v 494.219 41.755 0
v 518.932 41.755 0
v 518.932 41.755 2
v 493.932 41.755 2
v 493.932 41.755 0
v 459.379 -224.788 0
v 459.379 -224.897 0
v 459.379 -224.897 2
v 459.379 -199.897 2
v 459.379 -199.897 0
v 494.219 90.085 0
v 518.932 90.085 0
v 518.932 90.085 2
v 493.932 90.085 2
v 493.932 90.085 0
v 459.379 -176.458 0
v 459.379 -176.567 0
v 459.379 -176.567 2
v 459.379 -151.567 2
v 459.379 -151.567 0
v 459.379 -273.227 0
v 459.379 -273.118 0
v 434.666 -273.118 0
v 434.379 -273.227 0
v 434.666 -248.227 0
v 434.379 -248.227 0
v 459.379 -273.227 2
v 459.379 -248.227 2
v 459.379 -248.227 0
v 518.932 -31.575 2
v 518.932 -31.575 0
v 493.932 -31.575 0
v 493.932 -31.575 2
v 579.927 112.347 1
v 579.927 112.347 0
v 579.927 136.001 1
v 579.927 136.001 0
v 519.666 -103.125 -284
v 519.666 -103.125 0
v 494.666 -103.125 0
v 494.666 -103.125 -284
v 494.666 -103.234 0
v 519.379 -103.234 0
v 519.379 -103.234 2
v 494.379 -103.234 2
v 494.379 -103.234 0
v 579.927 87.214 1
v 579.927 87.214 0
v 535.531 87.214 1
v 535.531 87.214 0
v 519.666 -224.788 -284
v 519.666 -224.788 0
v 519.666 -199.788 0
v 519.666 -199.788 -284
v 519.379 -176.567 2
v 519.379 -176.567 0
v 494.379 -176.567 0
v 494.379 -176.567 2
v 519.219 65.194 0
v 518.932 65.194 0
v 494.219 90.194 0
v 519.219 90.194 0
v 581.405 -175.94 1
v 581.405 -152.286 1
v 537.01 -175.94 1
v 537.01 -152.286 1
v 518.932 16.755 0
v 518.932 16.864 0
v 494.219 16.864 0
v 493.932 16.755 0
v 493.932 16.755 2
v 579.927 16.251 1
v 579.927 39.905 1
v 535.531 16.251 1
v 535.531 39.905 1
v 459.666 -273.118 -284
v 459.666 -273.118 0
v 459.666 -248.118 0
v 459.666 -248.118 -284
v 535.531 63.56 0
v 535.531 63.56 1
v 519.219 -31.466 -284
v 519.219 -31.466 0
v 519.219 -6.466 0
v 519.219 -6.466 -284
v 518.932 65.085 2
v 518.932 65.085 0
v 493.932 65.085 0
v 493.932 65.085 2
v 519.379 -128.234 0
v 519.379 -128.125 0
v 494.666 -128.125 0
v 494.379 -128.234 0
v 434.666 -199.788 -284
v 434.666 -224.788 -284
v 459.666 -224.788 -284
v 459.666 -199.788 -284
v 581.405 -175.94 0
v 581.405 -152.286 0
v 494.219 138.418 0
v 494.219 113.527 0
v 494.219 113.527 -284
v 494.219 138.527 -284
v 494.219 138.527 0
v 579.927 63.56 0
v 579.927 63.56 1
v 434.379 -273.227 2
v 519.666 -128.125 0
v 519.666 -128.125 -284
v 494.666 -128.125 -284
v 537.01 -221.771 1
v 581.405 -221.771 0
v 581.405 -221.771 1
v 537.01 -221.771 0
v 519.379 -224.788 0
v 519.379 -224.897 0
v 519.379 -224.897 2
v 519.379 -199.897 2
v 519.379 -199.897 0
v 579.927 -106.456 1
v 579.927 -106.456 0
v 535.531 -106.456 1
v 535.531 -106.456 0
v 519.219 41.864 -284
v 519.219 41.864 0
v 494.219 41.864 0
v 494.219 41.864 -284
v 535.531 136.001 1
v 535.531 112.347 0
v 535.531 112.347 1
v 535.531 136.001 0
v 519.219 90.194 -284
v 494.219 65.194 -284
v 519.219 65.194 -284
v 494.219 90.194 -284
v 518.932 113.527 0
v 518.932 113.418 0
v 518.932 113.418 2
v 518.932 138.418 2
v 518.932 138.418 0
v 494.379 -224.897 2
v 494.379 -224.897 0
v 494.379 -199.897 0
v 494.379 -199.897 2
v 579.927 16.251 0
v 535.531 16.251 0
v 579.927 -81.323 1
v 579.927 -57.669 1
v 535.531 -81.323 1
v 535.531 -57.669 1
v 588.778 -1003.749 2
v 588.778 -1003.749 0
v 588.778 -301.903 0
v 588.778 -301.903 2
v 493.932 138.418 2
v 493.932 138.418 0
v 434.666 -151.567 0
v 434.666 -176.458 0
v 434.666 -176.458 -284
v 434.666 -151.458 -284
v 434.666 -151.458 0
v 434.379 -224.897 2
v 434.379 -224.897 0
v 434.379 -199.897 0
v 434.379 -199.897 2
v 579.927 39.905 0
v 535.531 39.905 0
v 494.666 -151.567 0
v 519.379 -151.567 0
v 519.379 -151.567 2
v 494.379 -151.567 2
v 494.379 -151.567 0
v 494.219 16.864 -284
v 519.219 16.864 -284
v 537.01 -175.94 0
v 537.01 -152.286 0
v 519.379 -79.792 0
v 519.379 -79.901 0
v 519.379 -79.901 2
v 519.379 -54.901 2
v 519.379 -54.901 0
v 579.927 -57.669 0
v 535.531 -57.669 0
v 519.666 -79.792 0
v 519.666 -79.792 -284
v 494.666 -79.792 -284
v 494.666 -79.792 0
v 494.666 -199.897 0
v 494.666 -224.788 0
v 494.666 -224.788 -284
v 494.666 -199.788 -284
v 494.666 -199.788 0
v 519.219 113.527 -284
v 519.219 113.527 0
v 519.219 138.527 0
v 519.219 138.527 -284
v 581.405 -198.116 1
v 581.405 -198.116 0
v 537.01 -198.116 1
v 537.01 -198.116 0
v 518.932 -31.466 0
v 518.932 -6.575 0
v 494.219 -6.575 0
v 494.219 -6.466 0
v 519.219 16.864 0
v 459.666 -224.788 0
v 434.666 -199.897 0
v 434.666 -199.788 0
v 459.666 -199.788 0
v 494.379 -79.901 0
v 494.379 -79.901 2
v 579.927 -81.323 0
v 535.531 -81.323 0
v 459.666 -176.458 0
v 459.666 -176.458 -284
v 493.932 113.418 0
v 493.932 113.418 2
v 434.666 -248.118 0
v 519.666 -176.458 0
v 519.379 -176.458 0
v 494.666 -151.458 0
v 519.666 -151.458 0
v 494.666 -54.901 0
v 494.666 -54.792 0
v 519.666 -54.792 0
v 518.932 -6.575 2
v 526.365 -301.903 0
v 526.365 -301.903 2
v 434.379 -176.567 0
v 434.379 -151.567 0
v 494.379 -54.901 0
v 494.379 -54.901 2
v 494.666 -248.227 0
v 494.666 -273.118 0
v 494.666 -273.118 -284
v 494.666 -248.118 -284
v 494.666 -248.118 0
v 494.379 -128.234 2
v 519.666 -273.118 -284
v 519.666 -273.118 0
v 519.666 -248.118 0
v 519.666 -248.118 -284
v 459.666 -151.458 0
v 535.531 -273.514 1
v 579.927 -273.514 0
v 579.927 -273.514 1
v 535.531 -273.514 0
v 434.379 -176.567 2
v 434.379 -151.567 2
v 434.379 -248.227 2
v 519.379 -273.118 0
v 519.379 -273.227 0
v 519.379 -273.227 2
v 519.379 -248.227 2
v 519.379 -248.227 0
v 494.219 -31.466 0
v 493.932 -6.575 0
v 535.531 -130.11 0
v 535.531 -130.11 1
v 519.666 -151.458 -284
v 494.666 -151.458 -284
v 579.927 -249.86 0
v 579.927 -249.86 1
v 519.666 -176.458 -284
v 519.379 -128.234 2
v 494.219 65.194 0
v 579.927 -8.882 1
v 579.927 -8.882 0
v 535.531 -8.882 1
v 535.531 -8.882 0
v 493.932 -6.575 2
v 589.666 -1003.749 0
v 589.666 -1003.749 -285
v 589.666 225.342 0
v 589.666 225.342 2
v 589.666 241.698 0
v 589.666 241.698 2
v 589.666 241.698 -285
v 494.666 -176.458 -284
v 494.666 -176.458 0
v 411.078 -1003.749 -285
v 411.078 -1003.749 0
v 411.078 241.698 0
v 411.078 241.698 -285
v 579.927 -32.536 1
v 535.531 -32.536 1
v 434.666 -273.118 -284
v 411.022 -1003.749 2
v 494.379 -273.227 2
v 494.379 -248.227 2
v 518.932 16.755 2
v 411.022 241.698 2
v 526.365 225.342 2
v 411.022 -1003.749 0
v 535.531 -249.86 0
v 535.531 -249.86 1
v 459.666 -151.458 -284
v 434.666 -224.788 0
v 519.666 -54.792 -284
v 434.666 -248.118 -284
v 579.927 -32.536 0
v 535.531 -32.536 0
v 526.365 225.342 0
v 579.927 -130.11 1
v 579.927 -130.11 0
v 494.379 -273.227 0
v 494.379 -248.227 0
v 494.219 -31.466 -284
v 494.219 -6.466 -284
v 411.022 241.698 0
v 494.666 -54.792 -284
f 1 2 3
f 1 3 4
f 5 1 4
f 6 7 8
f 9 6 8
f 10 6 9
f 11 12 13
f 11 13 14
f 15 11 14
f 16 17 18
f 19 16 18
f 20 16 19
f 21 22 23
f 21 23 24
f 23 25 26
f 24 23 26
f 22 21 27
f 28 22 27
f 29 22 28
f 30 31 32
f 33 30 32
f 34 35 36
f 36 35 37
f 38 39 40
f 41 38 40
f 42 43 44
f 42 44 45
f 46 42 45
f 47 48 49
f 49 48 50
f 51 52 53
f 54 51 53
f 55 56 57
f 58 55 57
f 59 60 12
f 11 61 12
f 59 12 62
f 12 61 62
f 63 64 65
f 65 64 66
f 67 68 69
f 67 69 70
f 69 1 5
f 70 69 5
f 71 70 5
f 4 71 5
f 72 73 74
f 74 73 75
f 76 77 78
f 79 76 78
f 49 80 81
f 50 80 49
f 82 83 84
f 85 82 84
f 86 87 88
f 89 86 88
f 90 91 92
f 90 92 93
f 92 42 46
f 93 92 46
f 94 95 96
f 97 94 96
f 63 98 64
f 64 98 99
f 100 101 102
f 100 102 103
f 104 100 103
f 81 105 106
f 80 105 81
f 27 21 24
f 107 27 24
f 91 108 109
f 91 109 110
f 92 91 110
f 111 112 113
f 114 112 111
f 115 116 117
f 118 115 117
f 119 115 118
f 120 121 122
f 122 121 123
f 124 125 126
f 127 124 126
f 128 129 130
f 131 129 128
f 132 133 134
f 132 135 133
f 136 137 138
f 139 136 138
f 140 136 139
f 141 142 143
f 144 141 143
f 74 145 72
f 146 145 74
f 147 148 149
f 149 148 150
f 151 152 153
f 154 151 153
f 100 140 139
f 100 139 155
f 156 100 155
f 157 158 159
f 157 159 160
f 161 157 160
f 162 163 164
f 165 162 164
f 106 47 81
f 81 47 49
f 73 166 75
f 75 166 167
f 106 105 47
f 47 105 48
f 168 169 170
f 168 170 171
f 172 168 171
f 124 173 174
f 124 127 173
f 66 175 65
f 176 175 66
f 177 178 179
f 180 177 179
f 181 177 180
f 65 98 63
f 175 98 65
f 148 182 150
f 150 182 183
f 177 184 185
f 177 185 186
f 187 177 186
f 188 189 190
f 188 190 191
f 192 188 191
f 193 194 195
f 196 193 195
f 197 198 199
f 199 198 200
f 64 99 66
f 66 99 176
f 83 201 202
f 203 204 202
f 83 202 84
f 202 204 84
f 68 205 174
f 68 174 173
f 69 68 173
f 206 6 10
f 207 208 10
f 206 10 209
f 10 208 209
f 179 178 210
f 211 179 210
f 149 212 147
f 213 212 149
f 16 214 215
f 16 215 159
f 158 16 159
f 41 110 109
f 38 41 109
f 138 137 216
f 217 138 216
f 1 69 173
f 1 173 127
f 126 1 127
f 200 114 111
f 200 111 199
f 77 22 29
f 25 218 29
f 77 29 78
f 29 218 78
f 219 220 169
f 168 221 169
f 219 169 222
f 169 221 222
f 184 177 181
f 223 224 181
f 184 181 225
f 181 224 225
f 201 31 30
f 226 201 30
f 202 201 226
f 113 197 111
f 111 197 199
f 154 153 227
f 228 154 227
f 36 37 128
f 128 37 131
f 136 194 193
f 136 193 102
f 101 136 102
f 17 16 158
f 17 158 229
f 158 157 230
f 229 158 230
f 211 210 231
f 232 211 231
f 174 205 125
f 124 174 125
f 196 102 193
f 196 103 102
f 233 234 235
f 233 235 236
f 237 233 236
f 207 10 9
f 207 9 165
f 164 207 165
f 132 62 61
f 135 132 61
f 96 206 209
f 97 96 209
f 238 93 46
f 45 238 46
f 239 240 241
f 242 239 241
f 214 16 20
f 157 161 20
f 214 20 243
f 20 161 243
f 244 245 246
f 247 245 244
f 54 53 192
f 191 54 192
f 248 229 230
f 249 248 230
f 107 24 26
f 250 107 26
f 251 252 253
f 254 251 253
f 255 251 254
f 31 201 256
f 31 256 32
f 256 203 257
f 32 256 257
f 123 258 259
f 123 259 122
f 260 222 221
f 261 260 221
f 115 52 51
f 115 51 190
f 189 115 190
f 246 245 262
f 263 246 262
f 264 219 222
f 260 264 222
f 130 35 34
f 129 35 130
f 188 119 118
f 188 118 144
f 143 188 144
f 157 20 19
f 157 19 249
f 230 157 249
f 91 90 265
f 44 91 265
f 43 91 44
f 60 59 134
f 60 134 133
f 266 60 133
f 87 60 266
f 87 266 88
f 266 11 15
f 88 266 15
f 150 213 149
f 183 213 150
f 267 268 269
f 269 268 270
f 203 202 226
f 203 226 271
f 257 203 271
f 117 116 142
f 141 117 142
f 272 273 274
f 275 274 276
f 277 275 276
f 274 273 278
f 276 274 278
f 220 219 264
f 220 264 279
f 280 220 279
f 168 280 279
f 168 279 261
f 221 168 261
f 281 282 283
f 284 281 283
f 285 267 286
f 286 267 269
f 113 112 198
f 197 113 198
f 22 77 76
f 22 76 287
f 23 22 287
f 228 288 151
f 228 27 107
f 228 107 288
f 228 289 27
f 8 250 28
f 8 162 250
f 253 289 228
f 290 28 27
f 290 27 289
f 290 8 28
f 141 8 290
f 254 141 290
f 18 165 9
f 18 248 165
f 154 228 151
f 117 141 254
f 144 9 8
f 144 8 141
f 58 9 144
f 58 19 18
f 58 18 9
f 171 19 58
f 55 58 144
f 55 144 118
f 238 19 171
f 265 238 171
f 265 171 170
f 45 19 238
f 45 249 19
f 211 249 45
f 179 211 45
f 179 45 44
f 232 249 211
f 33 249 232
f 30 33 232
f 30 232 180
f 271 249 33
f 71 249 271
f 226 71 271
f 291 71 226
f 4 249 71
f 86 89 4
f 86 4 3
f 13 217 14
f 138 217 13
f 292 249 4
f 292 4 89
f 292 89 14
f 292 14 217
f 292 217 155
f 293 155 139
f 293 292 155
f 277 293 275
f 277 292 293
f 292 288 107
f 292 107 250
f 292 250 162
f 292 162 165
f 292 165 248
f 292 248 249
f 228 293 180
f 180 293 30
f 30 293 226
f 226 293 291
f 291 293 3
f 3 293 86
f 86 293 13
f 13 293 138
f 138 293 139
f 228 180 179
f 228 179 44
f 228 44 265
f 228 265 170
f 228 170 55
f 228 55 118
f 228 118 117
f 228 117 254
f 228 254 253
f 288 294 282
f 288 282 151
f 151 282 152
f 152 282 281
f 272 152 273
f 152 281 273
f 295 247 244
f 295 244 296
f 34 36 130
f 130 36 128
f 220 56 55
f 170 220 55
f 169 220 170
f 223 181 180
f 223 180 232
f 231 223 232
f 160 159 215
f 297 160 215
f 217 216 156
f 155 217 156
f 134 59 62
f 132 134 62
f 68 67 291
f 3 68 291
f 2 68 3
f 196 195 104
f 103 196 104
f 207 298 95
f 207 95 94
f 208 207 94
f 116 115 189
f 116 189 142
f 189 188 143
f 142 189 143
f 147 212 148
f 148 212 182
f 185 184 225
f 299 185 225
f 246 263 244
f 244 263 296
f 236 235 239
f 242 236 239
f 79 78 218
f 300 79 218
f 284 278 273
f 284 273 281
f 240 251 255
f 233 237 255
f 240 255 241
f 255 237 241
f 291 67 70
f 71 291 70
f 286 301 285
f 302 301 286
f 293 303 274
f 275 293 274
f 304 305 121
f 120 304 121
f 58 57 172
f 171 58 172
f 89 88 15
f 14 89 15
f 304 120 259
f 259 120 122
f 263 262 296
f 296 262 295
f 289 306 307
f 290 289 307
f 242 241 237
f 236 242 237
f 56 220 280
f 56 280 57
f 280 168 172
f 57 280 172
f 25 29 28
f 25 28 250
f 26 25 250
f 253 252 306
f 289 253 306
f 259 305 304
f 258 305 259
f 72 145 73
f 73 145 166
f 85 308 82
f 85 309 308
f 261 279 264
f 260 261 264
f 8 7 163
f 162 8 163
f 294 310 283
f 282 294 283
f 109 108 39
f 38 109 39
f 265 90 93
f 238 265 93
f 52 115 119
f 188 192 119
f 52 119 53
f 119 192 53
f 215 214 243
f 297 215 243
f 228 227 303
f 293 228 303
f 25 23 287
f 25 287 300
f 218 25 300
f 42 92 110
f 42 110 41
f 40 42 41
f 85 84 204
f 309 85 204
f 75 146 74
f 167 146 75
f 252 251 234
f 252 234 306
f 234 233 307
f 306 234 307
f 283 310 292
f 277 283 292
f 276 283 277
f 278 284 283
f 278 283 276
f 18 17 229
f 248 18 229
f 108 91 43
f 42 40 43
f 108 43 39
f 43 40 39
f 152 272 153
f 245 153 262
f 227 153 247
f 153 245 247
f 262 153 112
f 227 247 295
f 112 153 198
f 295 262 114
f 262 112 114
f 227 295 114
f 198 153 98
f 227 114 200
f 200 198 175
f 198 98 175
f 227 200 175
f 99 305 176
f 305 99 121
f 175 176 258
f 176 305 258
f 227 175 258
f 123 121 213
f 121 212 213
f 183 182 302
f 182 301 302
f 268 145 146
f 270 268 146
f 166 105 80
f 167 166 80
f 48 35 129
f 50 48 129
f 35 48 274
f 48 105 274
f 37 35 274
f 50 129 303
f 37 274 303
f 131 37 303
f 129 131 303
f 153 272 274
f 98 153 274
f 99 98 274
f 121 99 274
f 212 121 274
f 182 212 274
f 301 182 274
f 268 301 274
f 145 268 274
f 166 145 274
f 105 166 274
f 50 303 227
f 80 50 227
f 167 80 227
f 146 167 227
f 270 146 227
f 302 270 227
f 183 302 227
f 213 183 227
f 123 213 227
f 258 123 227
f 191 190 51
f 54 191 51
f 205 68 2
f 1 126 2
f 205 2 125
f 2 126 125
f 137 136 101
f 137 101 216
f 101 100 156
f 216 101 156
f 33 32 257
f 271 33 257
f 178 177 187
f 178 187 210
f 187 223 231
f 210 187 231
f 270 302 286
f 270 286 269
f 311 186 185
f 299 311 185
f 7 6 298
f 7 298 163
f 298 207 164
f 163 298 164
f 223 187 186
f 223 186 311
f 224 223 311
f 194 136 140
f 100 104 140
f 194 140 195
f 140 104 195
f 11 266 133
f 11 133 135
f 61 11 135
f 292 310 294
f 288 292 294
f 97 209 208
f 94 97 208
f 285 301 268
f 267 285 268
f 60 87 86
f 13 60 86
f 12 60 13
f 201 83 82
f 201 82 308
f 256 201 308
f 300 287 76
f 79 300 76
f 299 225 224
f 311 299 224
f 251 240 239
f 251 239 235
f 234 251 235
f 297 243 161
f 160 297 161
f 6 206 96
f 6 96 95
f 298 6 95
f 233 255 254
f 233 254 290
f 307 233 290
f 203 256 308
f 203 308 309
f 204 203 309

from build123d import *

# Parameters (mm, degrees)
CROQUIS1_W              = 178.587886288
CROQUIS1_H              = 1245.447721363
CROQUIS1_W_2            = 25
CROQUIS1_H_2            = 25
SALIENTE_EXTRUIR2_DEPTH = 285
CROQUIS2_W              = 178.587886288
CROQUIS2_H              = 552.844893509
SALIENTE_EXTRUIR3_DEPTH = 1
CROQUIS5_W              = 25
CROQUIS5_H              = 25
SALIENTE_EXTRUIR4_DEPTH = 2
CROQUIS10_W             = 44.39506519
CROQUIS10_H             = 23.654322964
CROQUIS10_H_2           = 23.654322963
SALIENTE_EXTRUIR5_DEPTH = 1


with BuildPart() as part:
    # Croquis1 → Saliente-Extruir2 (new body)
    with BuildSketch(Plane.XY):
        with Locations((121.784181129, -381.025603562)):
            Rectangle(CROQUIS1_W, CROQUIS1_H)
        with Locations((174.990237985, -163.957841157)):
            Rectangle(CROQUIS1_W_2, CROQUIS1_H_2, mode=Mode.SUBTRACT)
        with Locations((115.437079382, 126.027179256)):
            Rectangle(CROQUIS1_W_2, CROQUIS1_H_2, mode=Mode.SUBTRACT)
        with Locations((115.437079382, 77.694179256)):
            Rectangle(CROQUIS1_W_2, CROQUIS1_H_2, mode=Mode.SUBTRACT)
        with Locations((115.437079382, 29.364179256)):
            Rectangle(CROQUIS1_W_2, CROQUIS1_H_2, mode=Mode.SUBTRACT)
        with Locations((115.437079382, -18.965820744)):
            Rectangle(CROQUIS1_W_2, CROQUIS1_H_2, mode=Mode.SUBTRACT)
        with Locations((114.990237985, -67.291541157)):
            Rectangle(CROQUIS1_W_2, CROQUIS1_H_2, mode=Mode.SUBTRACT)
        with Locations((114.990237985, -115.624841157)):
            Rectangle(CROQUIS1_W_2, CROQUIS1_H_2, mode=Mode.SUBTRACT)
        with Locations((114.990237985, -163.957841157)):
            Rectangle(CROQUIS1_W_2, CROQUIS1_H_2, mode=Mode.SUBTRACT)
        with Locations((114.990237985, -212.287841157)):
            Rectangle(CROQUIS1_W_2, CROQUIS1_H_2, mode=Mode.SUBTRACT)
        with Locations((114.990237985, -260.617841157)):
            Rectangle(CROQUIS1_W_2, CROQUIS1_H_2, mode=Mode.SUBTRACT)
        with Locations((174.990237985, -212.287841157)):
            Rectangle(CROQUIS1_W_2, CROQUIS1_H_2, mode=Mode.SUBTRACT)
        with Locations((174.990237985, -260.617841157)):
            Rectangle(CROQUIS1_W_2, CROQUIS1_H_2, mode=Mode.SUBTRACT)
    extrude(amount=-SALIENTE_EXTRUIR2_DEPTH)

    # Croquis2 → Saliente-Extruir3 (add)
    with BuildSketch(Plane(origin=(0, 0, -285), x_dir=(-1, 0, 0), z_dir=(0, 0, -1))):
        with Locations((-121.784181129, -34.724189635)):
            Rectangle(CROQUIS2_W, CROQUIS2_H)
    extrude(amount=-SALIENTE_EXTRUIR3_DEPTH)

    # Croquis5 → Saliente-Extruir4 (add)
    with BuildSketch(Plane.XY):
        Polygon((40.133927115, 241.69825712), (187.776914698, 241.69825712), (211.134564186, 241.69825712), (211.134564186, -1003.749464243), (33.378525324, -1003.749464243), (33.378525324, -301.90284108), (95.791395616, -301.90284108), (95.791395616, 225.342265798), (32.490237985, 225.342265798), (32.490237985, 241.69825712), align=None)
        with Locations((175.276914698, -164.067102515)):
            Rectangle(CROQUIS5_W, CROQUIS5_H, mode=Mode.SUBTRACT)
        with Locations((115.723756094, 125.917917897)):
            Rectangle(CROQUIS5_W, CROQUIS5_H, mode=Mode.SUBTRACT)
        with Locations((115.723756094, 77.584917897)):
            Rectangle(CROQUIS5_W, CROQUIS5_H, mode=Mode.SUBTRACT)
        with Locations((115.723756094, 29.254917897)):
            Rectangle(CROQUIS5_W, CROQUIS5_H, mode=Mode.SUBTRACT)
        with Locations((115.723756094, -19.075082103)):
            Rectangle(CROQUIS5_W, CROQUIS5_H, mode=Mode.SUBTRACT)
        with Locations((115.276914698, -67.400802515)):
            Rectangle(CROQUIS5_W, CROQUIS5_H, mode=Mode.SUBTRACT)
        with Locations((115.276914698, -115.734102515)):
            Rectangle(CROQUIS5_W, CROQUIS5_H, mode=Mode.SUBTRACT)
        with Locations((115.276914698, -164.067102515)):
            Rectangle(CROQUIS5_W, CROQUIS5_H, mode=Mode.SUBTRACT)
        with Locations((115.276914698, -212.397102515)):
            Rectangle(CROQUIS5_W, CROQUIS5_H, mode=Mode.SUBTRACT)
        with Locations((115.276914698, -260.727102515)):
            Rectangle(CROQUIS5_W, CROQUIS5_H, mode=Mode.SUBTRACT)
        with Locations((175.276914698, -212.397102515)):
            Rectangle(CROQUIS5_W, CROQUIS5_H, mode=Mode.SUBTRACT)
        with Locations((175.276914698, -260.727102515)):
            Rectangle(CROQUIS5_W, CROQUIS5_H, mode=Mode.SUBTRACT)
    extrude(amount=SALIENTE_EXTRUIR4_DEPTH)

    # Croquis10 → Saliente-Extruir5 (add)
    with BuildSketch(Plane.XY):
        with Locations((64.427271282, 75.386790193)):
            Rectangle(CROQUIS10_W, CROQUIS10_H)
        with Locations((64.427271282, -20.708896845)):
            Rectangle(CROQUIS10_W, CROQUIS10_H_2)
        with Locations((64.427271282, -69.495937956)):
            Rectangle(CROQUIS10_W, CROQUIS10_H_2)
        with Locations((64.427271282, -118.282979068)):
            Rectangle(CROQUIS10_W, CROQUIS10_H_2)
        with Locations((62.948876097, -164.113229809)):
            Rectangle(CROQUIS10_W, CROQUIS10_H_2)
        with Locations((62.948876097, -209.94348055)):
            Rectangle(CROQUIS10_W, CROQUIS10_H_2)
        with Locations((64.427271282, 28.078144267)):
            Rectangle(CROQUIS10_W, CROQUIS10_H_2)
        with Locations((64.427271282, 124.173831305)):
            Rectangle(CROQUIS10_W, CROQUIS10_H_2)
        with Locations((64.427271282, -261.687312031)):
            Rectangle(CROQUIS10_W, CROQUIS10_H)
    extrude(amount=SALIENTE_EXTRUIR5_DEPTH)


with BuildPart() as body_2:
    # Simetría1: mirrored copy
    add(part.part.mirror(Plane(origin=(311.078124273, 0, 0), x_dir=(0, 0, 1), z_dir=(1, 0, 0))))


solid = body_2.part
